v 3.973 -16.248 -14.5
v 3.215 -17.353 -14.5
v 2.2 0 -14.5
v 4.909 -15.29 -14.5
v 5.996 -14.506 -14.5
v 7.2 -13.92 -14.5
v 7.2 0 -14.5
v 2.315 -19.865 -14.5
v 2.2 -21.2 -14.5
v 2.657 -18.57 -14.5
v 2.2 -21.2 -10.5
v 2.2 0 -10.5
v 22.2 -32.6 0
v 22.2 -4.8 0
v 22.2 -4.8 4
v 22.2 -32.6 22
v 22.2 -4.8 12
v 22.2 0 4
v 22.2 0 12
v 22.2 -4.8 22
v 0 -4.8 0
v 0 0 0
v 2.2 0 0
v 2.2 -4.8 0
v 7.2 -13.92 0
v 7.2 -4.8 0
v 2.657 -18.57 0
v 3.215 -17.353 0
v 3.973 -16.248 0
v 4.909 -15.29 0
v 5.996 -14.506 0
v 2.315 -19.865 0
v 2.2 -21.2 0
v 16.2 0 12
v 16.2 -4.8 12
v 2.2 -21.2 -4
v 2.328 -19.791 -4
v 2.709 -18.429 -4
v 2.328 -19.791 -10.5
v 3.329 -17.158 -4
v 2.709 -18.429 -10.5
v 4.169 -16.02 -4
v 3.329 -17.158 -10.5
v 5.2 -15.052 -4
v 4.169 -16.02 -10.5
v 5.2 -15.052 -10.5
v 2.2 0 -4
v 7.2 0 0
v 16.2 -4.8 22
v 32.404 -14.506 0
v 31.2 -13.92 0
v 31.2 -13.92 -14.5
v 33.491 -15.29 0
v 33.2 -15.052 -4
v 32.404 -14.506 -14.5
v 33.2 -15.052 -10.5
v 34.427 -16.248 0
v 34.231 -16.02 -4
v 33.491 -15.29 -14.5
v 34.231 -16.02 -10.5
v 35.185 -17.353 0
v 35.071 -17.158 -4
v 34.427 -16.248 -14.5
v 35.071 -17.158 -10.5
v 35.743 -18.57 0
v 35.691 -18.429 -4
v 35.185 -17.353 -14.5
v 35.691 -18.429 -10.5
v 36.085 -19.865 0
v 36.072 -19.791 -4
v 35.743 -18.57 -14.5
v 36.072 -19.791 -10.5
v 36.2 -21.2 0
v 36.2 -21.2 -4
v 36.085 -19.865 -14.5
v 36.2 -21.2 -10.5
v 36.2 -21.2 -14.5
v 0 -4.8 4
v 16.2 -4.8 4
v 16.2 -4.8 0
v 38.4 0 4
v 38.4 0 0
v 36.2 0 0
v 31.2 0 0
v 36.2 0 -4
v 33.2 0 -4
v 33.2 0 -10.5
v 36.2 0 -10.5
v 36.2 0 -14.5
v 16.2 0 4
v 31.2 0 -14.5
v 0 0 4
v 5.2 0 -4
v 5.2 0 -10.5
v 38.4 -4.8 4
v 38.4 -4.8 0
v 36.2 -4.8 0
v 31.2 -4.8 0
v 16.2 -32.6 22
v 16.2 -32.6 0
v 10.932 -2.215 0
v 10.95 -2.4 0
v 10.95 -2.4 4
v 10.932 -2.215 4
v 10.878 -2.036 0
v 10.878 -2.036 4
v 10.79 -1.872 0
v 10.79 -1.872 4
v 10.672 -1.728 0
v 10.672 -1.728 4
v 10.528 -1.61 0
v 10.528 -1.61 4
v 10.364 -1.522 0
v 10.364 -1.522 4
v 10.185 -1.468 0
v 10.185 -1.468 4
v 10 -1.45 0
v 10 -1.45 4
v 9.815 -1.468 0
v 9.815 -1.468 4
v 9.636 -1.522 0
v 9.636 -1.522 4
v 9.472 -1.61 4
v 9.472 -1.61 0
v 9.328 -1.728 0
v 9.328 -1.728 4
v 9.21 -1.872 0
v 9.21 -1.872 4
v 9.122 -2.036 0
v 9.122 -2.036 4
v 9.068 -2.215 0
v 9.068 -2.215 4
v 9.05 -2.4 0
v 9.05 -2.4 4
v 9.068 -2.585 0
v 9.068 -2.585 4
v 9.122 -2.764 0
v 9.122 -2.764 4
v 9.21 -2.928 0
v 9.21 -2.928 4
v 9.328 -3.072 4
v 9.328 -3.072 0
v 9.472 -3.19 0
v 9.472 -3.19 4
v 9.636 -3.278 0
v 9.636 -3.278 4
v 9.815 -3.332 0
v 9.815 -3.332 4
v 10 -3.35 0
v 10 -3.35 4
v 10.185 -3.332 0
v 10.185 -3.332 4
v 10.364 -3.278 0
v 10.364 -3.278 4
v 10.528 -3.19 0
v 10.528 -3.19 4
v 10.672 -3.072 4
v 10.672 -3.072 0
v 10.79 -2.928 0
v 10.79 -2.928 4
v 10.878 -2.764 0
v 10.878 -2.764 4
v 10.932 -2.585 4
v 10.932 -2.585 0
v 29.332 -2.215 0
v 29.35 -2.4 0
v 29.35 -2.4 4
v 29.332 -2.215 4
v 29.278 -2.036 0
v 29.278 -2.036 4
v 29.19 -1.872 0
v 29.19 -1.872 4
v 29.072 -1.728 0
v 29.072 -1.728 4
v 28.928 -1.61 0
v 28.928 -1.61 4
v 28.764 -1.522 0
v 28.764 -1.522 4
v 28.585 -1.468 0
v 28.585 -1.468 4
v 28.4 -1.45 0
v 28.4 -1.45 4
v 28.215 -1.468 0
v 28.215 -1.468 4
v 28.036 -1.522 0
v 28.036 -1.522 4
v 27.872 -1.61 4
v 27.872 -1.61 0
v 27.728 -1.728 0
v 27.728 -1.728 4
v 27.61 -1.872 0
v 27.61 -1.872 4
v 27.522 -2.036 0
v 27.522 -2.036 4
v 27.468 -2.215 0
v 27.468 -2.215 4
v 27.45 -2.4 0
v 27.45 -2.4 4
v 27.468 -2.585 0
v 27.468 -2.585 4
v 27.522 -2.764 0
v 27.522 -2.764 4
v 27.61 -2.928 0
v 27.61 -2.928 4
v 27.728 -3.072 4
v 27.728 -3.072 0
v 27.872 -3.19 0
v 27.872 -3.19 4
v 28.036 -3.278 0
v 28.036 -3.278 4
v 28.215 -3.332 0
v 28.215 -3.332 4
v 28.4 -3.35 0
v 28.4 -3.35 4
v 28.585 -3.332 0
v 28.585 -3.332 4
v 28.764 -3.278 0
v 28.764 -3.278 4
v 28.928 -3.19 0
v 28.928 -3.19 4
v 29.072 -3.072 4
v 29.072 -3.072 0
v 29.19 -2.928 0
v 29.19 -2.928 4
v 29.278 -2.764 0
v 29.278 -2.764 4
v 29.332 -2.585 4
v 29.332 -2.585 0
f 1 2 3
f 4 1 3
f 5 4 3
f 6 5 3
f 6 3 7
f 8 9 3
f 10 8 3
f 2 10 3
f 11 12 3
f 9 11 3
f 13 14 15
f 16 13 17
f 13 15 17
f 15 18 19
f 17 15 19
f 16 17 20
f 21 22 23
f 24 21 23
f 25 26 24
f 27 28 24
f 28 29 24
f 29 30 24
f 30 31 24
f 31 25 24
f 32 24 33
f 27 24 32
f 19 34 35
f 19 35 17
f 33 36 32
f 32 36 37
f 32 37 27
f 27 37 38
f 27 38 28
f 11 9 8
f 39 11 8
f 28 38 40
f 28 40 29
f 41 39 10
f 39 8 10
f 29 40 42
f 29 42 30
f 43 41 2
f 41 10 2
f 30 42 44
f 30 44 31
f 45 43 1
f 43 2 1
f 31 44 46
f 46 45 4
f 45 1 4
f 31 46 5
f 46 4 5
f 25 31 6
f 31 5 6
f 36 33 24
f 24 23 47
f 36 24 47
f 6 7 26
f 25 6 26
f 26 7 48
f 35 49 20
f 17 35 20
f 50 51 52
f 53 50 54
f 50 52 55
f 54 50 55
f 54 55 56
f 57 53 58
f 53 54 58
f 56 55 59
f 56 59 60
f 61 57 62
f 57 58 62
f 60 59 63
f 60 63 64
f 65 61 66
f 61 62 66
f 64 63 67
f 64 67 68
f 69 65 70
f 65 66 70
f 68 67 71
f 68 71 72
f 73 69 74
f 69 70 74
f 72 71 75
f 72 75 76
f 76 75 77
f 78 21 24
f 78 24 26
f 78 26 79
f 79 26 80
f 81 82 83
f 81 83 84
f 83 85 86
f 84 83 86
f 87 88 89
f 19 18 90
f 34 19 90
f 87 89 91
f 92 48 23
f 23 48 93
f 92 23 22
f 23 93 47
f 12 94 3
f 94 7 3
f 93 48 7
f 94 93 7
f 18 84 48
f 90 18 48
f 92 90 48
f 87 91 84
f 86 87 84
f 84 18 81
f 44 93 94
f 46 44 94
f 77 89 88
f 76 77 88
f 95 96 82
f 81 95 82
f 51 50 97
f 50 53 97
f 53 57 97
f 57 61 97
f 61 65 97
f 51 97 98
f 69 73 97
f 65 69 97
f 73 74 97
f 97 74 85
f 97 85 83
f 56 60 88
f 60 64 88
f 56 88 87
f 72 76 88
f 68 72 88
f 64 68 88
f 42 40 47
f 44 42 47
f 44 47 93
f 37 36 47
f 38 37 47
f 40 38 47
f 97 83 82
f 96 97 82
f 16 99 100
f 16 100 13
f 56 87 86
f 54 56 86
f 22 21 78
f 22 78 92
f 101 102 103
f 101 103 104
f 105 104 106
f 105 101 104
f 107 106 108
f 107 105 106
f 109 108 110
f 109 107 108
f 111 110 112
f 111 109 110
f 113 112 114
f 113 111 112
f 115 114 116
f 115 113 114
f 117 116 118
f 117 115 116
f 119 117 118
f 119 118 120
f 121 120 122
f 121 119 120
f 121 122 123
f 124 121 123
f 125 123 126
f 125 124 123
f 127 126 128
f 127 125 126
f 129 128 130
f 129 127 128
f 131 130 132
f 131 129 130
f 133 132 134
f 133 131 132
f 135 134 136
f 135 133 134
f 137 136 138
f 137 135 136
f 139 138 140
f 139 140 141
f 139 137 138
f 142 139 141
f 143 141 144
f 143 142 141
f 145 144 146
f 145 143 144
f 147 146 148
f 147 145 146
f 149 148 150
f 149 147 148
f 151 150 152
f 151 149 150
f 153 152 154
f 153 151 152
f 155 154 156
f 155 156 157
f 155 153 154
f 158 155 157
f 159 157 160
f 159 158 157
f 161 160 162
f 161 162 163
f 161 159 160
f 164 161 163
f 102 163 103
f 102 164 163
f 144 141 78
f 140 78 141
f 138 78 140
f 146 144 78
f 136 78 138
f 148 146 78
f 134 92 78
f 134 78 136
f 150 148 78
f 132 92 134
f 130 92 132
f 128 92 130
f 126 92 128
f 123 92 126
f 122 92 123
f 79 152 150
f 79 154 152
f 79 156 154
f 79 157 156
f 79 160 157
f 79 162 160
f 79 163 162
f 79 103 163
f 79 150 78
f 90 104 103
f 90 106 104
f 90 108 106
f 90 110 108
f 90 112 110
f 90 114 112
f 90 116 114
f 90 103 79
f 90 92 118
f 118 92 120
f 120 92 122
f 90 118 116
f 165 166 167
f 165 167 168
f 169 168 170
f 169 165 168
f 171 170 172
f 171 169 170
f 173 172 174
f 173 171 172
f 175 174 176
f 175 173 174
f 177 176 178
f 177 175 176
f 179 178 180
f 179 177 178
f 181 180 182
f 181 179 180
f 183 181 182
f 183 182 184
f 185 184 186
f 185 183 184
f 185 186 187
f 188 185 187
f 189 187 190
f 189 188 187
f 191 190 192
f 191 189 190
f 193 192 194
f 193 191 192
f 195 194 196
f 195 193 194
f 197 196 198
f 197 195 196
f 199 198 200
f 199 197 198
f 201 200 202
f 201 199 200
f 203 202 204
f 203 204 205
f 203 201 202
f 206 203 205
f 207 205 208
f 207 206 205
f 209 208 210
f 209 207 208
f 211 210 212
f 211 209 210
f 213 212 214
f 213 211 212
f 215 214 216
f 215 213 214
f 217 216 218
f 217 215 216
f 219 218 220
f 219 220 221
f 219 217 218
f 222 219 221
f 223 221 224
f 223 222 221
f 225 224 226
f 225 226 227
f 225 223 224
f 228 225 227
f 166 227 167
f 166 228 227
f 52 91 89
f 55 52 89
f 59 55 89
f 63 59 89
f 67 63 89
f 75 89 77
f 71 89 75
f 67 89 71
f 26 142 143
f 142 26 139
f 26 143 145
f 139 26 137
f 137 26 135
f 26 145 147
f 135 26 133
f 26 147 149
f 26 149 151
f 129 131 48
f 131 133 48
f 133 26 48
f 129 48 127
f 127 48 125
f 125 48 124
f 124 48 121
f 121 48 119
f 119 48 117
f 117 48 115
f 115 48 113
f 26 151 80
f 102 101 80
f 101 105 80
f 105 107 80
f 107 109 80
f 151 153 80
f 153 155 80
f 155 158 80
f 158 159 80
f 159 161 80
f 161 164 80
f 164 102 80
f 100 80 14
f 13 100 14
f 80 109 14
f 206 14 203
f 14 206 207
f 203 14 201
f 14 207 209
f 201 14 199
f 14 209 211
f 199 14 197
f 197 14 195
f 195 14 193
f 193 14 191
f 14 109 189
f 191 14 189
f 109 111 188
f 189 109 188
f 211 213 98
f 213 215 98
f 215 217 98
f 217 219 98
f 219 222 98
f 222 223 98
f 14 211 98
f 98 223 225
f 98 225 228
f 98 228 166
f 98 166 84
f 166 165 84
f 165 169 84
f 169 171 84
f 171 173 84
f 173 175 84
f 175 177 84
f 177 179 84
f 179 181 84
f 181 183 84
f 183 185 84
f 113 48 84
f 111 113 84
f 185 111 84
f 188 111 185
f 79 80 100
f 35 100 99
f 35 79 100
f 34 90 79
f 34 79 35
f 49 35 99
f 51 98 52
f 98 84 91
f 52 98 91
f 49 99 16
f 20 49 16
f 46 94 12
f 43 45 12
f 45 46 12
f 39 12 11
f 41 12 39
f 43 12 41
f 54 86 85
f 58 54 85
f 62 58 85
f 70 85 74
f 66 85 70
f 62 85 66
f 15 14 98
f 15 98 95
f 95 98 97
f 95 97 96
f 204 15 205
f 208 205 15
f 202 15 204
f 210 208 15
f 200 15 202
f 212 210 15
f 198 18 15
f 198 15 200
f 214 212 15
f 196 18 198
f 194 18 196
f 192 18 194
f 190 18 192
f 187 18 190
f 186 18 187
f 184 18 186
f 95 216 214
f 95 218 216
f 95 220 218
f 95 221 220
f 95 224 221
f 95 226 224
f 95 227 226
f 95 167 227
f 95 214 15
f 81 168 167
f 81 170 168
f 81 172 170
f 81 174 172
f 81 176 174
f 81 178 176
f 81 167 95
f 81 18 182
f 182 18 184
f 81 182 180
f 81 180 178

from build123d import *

# Parameters (mm, degrees)
SKETCH_1_W          = 38.4
SKETCH_1_H          = 4.8
SKETCH_1_R          = 0.95
EXTRUDE_1_DEPTH     = 4
EXTRUDE_2_DEPTH     = 21.2
SKETCH_5_R          = 7.8
CUT_EXTRUDE_2_DEPTH = 14.5
SKETCH_8_W          = 6
SKETCH_8_H          = 4.8
EXTRUDE_4_DEPTH     = 8
SKETCH_9_W          = 6
SKETCH_9_H          = 22
EXTRUDE_5_DEPTH     = 27.8


with BuildPart() as part:
    # 草图1 → 凸台-拉伸1 (new body)
    with BuildSketch(Plane.XY):
        with Locations((19.2, -2.4)):
            Rectangle(SKETCH_1_W, SKETCH_1_H)
        with Locations((10, -2.4)):
            Circle(SKETCH_1_R, mode=Mode.SUBTRACT)
        with Locations((28.4, -2.4)):
            Circle(SKETCH_1_R, mode=Mode.SUBTRACT)
    extrude(amount=EXTRUDE_1_DEPTH)

    # 草图4 → 凸台-拉伸2 (add)
    with BuildSketch(Plane(origin=(0, 0, 0), x_dir=(1, 0, 0), z_dir=(0, 1, 0))):
        Polygon((2.2, 0), (2.2, 4), (5.2, 4), (5.2, 10.5), (2.2, 10.5), (2.2, 14.5), (7.2, 14.5), (7.2, 0), align=None)
        Polygon((36.2, 0), (31.2, 0), (31.2, 14.5), (36.2, 14.5), (36.2, 10.5), (33.2, 10.5), (33.2, 4), (36.2, 4), align=None)
    extrude(amount=-EXTRUDE_2_DEPTH)

    # 草图5 → 切除-拉伸2 (cut)
    with BuildSketch(Plane(origin=(0, 0, -14.5), x_dir=(-1, 0, 0), z_dir=(0, 0, -1))):
        with Locations((-10, -21.2)):
            Circle(SKETCH_5_R)
        with Locations((-28.4, -21.2)):
            Circle(SKETCH_5_R)
    extrude(amount=-CUT_EXTRUDE_2_DEPTH, mode=Mode.SUBTRACT)

    # 草图8 → 凸台-拉伸4 (add)
    with BuildSketch(Plane.XY.offset(4)):
        with Locations((19.2, -2.4)):
            Rectangle(SKETCH_8_W, SKETCH_8_H)
    extrude(amount=EXTRUDE_4_DEPTH)

    # 草图9 → 凸台-拉伸5 (add)
    with BuildSketch(Plane.XZ.offset(4.8)):
        with Locations((19.2, 11)):
            Rectangle(SKETCH_9_W, SKETCH_9_H)
    extrude(amount=EXTRUDE_5_DEPTH)


solid = part.part
